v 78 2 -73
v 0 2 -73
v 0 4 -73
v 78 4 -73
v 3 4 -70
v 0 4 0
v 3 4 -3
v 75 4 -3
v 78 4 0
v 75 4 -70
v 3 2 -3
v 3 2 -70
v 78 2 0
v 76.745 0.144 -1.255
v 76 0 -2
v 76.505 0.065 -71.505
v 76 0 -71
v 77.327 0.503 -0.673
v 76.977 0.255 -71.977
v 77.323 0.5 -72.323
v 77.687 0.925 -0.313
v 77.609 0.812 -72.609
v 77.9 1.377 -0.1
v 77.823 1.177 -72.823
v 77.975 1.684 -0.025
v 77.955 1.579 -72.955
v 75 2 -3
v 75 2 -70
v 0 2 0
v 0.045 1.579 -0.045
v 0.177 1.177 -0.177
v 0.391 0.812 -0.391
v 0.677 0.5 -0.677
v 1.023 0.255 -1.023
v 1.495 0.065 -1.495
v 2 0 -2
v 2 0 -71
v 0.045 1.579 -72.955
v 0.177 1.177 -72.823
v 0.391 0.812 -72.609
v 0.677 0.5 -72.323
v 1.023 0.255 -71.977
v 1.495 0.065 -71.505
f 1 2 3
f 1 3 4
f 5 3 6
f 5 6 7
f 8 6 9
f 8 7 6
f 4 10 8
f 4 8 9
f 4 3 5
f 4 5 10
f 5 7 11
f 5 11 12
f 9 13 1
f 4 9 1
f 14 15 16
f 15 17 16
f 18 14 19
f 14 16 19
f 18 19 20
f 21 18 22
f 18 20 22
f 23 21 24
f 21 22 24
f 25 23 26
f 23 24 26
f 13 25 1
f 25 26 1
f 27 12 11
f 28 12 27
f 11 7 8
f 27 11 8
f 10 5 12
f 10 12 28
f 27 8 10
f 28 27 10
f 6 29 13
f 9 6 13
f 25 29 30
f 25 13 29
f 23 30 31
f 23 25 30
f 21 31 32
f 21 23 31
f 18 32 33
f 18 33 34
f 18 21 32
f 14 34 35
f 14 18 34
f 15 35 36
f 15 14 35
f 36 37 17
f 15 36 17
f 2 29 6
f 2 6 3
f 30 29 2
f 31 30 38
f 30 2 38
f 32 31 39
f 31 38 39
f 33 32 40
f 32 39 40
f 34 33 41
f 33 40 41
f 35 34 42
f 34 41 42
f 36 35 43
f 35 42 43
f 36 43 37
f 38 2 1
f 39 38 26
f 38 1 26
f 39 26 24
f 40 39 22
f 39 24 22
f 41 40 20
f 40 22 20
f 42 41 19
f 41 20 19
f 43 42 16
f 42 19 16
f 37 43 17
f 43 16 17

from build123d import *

# Parameters (mm, degrees)
SKETCH2_W           = 78
SKETCH2_H           = 73
BOSS_EXTRUDE1_DEPTH = 4
SKETCH3_W           = 72
SKETCH3_H           = 67
CUT_EXTRUDE1_DEPTH  = 2
FILLET1_R           = 2


with BuildPart() as part:
    # Sketch2 → Boss-Extrude1 (new body)
    with BuildSketch(Plane(origin=(0, 0, 0), x_dir=(1, 0, 0), z_dir=(0, 1, 0))):
        with Locations((39, 36.5)):
            Rectangle(SKETCH2_W, SKETCH2_H)
    extrude(amount=BOSS_EXTRUDE1_DEPTH)

    # Sketch3 → Cut-Extrude1 (cut)
    with BuildSketch(Plane(origin=(0, 4, 0), x_dir=(1, 0, 0), z_dir=(0, 1, 0))):
        with Locations((39, 36.5)):
            Rectangle(SKETCH3_W, SKETCH3_H)
    extrude(amount=-CUT_EXTRUDE1_DEPTH, mode=Mode.SUBTRACT)

    # Fillet1
    fillet1_edges = [part.edges().sort_by_distance(p)[0] for p in [
        (39, 0, -73),
        (78, 0, -36.5),
        (39, 0, 0),
        (0, 0, -36.5),
    ]]
    fillet(fillet1_edges, radius=FILLET1_R)


solid = part.part
